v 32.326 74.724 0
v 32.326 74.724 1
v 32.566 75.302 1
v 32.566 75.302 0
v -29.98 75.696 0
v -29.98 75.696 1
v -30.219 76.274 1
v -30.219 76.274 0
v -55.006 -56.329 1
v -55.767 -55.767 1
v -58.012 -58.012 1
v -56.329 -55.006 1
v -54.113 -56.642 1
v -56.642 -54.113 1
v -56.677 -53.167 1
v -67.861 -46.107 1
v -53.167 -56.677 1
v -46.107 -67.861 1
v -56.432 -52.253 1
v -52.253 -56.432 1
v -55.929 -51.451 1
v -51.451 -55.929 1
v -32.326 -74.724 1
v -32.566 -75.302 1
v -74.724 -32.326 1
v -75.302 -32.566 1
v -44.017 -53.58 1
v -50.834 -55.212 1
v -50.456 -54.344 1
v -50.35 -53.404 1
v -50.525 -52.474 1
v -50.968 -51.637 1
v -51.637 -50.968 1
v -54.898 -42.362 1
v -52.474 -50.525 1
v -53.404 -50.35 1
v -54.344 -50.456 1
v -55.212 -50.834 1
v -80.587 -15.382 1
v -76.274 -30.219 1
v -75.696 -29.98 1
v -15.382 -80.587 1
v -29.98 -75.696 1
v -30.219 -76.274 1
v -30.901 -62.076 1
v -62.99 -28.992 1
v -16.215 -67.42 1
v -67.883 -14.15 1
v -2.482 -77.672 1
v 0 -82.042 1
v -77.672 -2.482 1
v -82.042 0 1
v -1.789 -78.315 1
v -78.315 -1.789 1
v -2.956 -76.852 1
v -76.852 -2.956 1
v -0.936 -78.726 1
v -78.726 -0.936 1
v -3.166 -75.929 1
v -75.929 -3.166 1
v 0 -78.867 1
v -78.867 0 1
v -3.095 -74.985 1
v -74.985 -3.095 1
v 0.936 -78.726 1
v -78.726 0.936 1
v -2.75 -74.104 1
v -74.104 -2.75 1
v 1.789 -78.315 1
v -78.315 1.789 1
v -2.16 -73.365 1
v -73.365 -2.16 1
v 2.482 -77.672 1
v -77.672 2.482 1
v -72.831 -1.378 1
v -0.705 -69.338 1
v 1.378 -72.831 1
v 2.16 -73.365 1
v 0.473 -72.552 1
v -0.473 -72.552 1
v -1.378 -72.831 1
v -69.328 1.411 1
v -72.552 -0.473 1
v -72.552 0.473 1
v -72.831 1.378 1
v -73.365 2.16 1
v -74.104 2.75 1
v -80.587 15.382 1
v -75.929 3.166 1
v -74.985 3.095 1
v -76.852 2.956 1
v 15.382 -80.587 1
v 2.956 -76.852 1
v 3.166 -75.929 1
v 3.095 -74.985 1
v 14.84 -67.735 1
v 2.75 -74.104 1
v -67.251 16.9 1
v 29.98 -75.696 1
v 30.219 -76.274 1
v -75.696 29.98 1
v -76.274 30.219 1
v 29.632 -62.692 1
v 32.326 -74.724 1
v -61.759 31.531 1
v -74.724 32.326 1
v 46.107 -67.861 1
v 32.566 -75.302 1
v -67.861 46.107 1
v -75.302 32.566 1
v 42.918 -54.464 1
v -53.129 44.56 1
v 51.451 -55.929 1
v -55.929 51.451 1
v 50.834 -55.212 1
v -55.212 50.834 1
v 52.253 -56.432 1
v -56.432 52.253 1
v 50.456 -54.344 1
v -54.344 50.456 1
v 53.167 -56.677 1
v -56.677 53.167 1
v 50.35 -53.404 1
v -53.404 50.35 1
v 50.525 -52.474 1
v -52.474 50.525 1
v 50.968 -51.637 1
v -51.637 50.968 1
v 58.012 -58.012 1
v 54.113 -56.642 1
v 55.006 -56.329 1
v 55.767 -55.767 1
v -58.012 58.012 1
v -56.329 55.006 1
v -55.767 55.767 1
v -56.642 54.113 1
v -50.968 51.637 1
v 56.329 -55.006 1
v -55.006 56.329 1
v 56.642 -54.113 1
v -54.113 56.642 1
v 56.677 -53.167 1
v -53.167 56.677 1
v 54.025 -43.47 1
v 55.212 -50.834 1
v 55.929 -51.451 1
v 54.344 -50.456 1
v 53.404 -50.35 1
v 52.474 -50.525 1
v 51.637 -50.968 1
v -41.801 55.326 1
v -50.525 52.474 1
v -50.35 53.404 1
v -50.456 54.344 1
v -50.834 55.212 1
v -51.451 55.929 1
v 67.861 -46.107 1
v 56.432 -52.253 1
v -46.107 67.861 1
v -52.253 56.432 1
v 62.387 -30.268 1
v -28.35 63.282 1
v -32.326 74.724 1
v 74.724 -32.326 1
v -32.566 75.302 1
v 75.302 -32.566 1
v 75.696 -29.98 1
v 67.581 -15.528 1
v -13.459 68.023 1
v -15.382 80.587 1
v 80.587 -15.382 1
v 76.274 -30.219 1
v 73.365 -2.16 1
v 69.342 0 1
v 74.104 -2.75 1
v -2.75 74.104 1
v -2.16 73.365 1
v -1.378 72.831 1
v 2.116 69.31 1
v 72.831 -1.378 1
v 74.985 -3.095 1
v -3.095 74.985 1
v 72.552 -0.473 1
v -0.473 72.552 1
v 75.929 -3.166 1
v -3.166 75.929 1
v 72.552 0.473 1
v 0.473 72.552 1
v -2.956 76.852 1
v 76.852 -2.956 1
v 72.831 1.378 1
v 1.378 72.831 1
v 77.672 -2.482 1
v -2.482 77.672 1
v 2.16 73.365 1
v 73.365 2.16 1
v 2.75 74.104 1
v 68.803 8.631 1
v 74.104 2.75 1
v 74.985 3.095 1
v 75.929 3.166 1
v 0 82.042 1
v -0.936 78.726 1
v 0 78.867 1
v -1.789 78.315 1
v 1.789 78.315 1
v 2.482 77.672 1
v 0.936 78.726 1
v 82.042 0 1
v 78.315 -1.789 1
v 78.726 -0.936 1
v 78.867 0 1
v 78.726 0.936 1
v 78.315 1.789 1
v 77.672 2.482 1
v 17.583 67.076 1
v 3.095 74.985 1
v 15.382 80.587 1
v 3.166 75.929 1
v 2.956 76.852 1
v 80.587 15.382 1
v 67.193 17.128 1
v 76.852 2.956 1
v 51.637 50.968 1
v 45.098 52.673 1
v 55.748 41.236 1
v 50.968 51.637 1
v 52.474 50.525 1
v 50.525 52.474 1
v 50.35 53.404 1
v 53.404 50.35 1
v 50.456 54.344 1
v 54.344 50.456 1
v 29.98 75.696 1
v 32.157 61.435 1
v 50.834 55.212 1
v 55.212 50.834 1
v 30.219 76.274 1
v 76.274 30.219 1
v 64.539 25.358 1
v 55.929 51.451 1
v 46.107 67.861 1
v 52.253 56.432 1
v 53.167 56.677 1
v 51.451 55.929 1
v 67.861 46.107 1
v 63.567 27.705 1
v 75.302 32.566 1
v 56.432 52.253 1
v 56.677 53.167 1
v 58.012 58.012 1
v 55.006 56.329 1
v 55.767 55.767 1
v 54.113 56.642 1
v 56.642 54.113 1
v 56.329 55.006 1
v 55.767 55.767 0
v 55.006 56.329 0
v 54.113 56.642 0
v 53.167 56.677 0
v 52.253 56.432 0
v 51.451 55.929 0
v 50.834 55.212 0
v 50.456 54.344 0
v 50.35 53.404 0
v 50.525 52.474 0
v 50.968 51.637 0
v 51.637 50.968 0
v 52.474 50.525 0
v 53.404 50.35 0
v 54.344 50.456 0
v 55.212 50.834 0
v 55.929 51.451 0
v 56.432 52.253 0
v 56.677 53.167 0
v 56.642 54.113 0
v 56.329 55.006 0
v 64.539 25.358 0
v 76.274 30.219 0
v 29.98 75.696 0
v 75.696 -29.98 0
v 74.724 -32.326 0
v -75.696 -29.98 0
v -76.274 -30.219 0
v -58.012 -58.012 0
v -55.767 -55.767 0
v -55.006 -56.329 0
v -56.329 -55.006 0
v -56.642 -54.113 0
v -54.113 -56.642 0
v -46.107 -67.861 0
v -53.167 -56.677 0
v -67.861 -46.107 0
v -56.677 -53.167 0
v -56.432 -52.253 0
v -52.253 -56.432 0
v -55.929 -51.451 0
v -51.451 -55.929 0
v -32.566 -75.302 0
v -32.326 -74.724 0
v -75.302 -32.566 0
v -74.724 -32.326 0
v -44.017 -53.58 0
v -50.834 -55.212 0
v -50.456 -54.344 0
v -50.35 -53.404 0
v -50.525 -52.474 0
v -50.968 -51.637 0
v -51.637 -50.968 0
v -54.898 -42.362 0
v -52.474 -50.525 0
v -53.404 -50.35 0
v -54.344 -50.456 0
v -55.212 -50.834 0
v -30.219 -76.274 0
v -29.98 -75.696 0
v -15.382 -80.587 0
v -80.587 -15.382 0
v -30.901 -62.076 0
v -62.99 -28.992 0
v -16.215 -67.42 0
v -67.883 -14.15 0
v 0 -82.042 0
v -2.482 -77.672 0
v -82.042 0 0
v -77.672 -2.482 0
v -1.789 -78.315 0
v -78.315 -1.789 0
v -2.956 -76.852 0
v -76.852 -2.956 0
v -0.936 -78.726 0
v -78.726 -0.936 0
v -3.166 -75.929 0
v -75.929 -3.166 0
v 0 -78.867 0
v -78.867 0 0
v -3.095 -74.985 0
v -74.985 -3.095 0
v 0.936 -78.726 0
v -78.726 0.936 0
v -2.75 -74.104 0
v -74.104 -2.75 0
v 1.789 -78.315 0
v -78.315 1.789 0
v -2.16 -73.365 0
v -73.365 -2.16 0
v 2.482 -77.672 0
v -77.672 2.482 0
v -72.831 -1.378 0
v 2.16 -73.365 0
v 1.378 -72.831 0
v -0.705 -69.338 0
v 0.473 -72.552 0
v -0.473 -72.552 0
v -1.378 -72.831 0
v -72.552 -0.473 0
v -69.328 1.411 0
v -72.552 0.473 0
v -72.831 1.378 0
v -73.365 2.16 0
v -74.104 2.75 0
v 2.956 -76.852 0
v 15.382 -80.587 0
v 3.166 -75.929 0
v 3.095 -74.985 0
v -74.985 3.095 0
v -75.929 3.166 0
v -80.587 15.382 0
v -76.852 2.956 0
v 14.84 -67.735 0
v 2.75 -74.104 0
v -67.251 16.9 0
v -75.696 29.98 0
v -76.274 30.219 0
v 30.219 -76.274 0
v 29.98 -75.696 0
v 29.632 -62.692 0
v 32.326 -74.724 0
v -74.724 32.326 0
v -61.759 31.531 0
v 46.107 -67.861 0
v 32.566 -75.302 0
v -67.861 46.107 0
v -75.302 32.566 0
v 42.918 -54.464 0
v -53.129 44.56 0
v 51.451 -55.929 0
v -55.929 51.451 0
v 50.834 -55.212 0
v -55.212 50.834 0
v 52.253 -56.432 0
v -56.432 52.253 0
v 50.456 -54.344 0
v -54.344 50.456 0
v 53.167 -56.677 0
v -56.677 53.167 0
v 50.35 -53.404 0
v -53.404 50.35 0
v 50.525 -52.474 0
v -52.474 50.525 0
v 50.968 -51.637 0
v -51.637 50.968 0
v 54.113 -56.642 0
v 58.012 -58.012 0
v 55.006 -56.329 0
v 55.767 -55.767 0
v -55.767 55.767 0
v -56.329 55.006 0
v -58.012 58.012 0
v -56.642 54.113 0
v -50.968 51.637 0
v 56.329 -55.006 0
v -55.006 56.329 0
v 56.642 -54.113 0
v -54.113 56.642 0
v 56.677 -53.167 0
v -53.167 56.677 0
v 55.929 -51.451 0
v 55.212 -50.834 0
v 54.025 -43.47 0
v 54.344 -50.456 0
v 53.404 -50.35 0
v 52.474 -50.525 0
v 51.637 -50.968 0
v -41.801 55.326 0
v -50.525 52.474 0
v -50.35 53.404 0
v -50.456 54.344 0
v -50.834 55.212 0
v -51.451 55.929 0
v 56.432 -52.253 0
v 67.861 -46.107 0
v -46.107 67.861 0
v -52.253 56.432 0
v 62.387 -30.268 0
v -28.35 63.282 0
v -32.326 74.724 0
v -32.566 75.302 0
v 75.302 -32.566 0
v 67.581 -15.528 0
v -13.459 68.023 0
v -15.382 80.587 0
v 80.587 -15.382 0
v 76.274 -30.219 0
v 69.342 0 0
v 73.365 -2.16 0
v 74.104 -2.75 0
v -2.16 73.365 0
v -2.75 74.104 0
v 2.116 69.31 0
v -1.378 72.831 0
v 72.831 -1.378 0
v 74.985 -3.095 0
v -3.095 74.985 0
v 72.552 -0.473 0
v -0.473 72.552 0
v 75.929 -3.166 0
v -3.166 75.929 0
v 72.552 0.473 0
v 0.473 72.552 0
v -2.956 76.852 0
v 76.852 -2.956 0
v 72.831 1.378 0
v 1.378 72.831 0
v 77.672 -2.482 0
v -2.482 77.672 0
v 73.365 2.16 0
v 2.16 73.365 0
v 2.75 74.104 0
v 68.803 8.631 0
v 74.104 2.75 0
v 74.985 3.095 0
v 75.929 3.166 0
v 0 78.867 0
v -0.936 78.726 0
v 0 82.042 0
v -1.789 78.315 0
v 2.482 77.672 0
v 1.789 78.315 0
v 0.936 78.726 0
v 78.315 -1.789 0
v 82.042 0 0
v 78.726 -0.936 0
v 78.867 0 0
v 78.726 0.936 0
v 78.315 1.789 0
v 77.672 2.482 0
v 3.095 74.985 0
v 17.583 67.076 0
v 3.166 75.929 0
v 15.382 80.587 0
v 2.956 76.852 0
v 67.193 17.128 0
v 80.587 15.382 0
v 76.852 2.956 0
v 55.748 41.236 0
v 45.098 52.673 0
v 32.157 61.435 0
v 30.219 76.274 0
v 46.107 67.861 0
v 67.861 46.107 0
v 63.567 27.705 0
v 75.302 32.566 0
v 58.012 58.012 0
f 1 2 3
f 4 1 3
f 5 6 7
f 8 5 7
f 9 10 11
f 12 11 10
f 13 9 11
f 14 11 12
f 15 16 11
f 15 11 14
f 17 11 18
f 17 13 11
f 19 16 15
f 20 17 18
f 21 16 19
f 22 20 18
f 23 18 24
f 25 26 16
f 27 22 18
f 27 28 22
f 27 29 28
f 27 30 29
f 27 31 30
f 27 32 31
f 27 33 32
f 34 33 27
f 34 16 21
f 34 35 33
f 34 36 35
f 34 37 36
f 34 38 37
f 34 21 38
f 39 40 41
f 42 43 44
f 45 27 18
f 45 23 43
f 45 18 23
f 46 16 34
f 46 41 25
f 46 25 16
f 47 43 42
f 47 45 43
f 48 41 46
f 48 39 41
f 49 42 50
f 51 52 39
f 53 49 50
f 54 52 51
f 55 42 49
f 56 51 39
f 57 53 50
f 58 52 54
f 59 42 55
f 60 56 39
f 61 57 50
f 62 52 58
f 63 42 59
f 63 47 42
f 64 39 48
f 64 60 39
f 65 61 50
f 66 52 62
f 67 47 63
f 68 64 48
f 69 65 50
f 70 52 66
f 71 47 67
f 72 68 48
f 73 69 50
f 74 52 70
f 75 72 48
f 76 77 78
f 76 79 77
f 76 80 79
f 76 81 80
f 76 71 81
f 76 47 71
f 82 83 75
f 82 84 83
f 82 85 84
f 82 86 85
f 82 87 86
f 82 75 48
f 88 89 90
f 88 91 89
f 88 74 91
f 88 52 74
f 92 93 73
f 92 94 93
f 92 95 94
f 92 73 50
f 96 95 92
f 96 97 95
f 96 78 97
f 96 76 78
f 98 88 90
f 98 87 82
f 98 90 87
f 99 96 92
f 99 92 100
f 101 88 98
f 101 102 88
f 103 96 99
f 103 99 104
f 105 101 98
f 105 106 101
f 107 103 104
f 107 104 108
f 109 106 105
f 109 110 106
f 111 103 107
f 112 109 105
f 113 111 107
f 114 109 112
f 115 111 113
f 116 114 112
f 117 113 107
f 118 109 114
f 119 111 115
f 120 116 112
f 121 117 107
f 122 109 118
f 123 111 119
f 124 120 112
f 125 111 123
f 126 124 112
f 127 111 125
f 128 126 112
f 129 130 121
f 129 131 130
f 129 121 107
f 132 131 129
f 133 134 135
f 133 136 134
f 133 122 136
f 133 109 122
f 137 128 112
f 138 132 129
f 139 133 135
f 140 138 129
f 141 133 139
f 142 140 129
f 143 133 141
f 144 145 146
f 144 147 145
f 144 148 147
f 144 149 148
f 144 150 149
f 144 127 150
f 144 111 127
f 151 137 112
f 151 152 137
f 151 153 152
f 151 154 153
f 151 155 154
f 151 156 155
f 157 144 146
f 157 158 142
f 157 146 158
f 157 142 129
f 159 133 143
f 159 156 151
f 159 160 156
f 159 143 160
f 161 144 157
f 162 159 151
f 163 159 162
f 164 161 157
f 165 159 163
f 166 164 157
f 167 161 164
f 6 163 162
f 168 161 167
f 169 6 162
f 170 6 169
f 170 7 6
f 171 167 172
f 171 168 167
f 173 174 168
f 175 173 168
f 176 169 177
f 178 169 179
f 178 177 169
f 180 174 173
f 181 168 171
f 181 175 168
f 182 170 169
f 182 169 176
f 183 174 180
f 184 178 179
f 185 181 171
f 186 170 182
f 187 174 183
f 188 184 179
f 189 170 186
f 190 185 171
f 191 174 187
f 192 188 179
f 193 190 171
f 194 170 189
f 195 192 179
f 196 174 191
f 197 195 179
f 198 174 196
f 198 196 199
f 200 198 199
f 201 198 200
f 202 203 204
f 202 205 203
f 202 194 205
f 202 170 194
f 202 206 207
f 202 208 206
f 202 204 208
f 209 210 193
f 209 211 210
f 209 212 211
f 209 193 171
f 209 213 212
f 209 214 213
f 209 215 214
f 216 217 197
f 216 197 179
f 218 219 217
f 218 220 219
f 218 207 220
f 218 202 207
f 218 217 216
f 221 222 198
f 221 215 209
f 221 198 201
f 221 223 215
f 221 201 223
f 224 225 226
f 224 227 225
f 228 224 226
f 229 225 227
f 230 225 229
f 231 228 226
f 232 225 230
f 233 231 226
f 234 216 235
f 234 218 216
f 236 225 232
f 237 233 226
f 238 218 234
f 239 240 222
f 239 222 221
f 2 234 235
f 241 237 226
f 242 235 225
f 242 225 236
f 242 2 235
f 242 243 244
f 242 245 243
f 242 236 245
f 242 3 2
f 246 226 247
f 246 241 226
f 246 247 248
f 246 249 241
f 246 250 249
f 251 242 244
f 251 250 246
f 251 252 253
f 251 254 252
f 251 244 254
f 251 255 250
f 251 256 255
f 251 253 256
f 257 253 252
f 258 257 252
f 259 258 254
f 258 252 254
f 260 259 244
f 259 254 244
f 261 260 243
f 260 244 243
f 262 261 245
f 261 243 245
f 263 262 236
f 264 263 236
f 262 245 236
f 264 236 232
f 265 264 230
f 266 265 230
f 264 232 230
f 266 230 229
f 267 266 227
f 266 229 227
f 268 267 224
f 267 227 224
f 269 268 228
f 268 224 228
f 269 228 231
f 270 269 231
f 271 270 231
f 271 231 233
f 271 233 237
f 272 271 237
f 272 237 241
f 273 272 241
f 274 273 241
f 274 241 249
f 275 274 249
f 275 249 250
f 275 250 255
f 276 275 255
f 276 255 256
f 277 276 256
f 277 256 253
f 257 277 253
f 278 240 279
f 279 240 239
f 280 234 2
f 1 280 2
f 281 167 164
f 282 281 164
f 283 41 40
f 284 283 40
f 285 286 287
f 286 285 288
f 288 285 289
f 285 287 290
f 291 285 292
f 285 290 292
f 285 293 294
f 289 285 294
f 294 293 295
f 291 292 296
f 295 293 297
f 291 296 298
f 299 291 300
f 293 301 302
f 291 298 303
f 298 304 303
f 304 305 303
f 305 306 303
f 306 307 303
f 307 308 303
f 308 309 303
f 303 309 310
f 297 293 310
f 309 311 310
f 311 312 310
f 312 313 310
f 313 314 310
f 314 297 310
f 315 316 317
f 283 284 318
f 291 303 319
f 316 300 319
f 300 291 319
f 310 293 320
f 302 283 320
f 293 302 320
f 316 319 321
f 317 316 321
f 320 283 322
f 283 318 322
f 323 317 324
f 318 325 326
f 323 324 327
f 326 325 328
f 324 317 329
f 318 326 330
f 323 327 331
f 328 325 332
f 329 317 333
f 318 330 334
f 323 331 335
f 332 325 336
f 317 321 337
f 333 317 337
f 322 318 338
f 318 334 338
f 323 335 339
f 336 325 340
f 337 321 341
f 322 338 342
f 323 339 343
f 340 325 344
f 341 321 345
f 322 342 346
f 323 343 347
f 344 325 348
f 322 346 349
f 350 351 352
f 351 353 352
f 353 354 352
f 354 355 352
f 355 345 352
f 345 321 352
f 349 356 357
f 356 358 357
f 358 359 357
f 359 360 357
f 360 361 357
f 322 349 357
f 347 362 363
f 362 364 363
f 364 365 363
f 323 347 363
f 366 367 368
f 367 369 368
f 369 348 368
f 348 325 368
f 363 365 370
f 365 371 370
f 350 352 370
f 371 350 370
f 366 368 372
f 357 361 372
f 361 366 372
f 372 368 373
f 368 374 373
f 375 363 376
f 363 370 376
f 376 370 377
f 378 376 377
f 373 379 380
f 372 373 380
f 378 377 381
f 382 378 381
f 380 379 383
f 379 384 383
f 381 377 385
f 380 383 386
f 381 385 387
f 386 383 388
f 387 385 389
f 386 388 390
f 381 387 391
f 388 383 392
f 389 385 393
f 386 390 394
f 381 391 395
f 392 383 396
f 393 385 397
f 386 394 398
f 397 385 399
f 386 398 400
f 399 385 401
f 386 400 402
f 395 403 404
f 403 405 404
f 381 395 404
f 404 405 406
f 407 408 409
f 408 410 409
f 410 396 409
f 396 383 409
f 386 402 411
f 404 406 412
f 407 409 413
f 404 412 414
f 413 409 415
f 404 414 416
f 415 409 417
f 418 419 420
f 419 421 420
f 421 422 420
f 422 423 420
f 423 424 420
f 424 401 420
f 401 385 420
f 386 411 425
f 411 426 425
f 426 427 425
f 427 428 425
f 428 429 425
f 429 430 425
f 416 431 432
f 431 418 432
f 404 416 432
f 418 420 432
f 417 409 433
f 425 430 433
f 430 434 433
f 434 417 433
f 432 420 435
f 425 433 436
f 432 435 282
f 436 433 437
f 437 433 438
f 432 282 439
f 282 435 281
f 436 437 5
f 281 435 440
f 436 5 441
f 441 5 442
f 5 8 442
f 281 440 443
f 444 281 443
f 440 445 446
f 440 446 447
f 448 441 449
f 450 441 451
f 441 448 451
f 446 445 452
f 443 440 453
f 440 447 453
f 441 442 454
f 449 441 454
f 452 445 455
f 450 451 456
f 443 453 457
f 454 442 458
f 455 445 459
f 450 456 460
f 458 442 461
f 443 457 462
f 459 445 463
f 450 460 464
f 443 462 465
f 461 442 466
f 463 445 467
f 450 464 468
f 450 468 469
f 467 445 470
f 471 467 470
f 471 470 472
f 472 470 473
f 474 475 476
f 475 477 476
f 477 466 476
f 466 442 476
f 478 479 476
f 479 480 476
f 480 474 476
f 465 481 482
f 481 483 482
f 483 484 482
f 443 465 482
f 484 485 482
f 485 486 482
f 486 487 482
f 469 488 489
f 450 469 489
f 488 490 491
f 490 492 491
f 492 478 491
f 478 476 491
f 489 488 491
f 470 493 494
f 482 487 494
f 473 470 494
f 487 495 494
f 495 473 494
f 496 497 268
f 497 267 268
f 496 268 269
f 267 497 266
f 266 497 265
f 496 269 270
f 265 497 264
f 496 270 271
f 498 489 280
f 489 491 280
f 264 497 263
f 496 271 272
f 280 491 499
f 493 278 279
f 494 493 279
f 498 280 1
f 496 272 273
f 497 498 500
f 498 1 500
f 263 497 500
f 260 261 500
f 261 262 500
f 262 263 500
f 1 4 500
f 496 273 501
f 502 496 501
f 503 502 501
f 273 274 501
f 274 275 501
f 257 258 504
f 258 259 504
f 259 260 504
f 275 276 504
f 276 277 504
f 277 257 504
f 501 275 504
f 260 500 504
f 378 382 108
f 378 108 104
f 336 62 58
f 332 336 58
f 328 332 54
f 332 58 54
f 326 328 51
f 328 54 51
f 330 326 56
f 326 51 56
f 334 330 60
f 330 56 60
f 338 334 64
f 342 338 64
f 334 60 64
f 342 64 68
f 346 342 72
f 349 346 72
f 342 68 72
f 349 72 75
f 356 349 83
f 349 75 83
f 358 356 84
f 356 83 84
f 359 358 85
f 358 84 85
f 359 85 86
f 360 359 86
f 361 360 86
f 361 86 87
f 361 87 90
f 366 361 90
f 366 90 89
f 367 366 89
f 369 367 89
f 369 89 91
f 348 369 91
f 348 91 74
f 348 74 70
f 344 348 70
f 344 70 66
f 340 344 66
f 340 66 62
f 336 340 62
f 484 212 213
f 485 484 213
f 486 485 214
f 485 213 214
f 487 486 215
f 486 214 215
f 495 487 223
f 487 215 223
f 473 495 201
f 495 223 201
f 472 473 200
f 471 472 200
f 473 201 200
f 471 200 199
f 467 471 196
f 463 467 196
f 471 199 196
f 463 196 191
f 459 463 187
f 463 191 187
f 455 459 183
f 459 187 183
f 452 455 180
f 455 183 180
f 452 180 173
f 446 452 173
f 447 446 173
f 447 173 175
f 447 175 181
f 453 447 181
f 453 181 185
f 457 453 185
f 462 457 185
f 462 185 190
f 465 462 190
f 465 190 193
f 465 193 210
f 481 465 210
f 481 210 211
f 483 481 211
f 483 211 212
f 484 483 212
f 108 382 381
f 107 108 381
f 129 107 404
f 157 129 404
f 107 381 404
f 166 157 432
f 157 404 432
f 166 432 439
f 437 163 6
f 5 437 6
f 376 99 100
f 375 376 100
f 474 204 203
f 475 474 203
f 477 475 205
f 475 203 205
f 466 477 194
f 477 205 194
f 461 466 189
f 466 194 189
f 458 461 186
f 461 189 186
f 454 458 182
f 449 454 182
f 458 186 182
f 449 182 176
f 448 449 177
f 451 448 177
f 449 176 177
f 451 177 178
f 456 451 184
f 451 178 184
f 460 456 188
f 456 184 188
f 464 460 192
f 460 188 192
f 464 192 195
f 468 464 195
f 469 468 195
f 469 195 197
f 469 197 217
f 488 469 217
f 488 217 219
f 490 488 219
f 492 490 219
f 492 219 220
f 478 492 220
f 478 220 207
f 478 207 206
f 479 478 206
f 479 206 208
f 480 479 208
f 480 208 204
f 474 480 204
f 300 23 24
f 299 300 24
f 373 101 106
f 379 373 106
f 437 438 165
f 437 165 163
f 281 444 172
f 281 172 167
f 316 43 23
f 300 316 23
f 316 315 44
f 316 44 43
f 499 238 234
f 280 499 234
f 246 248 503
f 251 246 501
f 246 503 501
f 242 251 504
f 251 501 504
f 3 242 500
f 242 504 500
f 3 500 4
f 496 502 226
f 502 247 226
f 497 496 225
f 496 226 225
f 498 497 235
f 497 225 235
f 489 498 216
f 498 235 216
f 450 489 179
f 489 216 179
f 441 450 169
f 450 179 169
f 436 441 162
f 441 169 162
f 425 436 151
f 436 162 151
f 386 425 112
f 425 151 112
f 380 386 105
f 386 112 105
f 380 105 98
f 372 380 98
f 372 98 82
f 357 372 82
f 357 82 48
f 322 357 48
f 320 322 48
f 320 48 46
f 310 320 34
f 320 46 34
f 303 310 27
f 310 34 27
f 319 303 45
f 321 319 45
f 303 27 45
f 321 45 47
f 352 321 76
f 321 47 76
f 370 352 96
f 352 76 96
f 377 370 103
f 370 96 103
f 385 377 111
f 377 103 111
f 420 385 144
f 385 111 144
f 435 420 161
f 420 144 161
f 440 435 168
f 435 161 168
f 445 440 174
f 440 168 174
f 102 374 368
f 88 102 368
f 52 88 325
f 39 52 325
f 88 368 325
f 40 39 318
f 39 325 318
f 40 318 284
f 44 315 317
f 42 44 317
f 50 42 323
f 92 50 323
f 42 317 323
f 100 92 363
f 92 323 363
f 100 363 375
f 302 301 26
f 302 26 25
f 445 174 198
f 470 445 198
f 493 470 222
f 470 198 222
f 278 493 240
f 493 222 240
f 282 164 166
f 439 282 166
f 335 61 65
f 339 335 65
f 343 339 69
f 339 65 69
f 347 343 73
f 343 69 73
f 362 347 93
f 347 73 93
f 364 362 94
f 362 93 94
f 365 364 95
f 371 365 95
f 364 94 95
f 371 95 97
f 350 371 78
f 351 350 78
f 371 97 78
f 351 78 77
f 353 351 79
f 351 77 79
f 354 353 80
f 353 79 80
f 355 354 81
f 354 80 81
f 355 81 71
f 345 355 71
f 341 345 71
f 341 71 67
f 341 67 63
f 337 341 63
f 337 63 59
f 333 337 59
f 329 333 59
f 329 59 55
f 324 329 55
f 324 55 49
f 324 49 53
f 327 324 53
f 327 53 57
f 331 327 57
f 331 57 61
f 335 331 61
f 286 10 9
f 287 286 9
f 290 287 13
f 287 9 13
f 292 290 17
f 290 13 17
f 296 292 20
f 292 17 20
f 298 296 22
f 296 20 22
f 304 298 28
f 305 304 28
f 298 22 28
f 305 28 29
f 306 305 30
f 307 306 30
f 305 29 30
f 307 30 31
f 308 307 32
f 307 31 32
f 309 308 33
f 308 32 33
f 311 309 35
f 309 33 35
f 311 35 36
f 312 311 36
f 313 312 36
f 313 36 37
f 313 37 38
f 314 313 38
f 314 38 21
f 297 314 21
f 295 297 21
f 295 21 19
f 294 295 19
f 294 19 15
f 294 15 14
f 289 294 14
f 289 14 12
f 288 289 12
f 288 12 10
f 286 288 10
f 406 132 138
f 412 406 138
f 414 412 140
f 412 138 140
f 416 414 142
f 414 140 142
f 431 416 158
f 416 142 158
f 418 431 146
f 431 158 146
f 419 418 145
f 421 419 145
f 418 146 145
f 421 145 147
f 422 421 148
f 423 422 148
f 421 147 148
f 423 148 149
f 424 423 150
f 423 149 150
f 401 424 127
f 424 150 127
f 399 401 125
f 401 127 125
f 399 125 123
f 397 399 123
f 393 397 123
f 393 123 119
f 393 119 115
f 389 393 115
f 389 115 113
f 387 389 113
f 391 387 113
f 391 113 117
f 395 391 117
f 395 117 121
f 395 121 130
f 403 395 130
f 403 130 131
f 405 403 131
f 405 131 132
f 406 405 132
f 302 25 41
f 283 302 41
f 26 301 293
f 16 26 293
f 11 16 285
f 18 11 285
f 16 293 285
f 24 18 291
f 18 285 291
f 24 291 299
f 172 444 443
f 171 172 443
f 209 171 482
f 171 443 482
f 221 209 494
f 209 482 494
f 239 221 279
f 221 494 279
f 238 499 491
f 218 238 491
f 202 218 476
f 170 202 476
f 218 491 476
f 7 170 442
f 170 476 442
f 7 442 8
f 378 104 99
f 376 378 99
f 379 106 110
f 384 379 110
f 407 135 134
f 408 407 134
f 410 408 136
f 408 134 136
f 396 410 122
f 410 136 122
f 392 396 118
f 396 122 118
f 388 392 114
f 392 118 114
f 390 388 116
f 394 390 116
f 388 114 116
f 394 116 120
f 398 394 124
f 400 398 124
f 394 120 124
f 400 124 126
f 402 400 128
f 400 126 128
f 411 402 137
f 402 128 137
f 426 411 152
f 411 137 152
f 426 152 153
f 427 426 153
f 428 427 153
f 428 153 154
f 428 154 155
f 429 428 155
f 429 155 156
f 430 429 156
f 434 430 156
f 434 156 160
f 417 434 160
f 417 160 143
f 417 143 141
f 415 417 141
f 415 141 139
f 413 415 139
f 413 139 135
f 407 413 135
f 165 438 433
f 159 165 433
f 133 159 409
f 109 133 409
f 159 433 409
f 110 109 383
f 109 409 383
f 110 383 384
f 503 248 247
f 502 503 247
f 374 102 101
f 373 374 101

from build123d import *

# Parameters (mm, degrees)
SKETCH4_R           = 82.042
BOSS_EXTRUDE2_DEPTH = 1
SKETCH5_R           = 69.342
CUT_EXTRUDE5_DEPTH  = 2
SKETCH6_R           = 3.175
CUT_EXTRUDE6_DEPTH  = 2
CIRPATTERN1_COUNT   = 8
CUT_EXTRUDE11_DEPTH = 2


with BuildPart() as part:
    # Sketch4 → Boss-Extrude2 (new body)
    with BuildSketch(Plane.XY):
        Circle(SKETCH4_R)
    extrude(amount=BOSS_EXTRUDE2_DEPTH)

    # Sketch5 → Cut-Extrude5 (cut, through all)
    with BuildSketch(Plane.XY.offset(1)):
        Circle(SKETCH5_R)
    extrude(amount=-CUT_EXTRUDE5_DEPTH, mode=Mode.SUBTRACT)

    # Sketch6 → Cut-Extrude6 (cut, through all)
    with BuildSketch(Plane.XY.offset(1)):
        with Locations((75.692, 0)):
            Circle(SKETCH6_R)
    cut_extrude6 = extrude(amount=-CUT_EXTRUDE6_DEPTH, mode=Mode.SUBTRACT)

    # CirPattern1: Cut-Extrude6 ×8 about axis
    cirpattern1_axis = Axis((0, 0, 0), (0, 0, 1))
    for i in range(1, CIRPATTERN1_COUNT):
        add(cut_extrude6.rotate(cirpattern1_axis, i * 360 / CIRPATTERN1_COUNT), mode=Mode.SUBTRACT)

    # Sketch8 → Cut-Extrude11 (cut, through all)
    with BuildSketch(Plane.XY.offset(1)):
        Polygon((78.830897666, 34.027465042), (60.057665565, 26.251337696), (61.029681484, 23.904683683), (79.802913584, 31.680811029), align=None)
        Polygon((32.812445144, 75.89758015), (30.465791131, 76.869596069), (29.979783172, 75.696269062), (32.326437185, 74.724253144), align=None)
        Polygon((-30.465791131, 76.869596069), (-32.812445144, 75.89758015), (-32.326437185, 74.724253144), (-29.979783172, 75.696269062), align=None)
        Polygon((-75.89758015, 32.812445144), (-76.869596069, 30.465791131), (-75.696269062, 29.979783172), (-74.724253144, 32.326437185), align=None)
        Polygon((-76.869596069, -30.465791131), (-75.89758015, -32.812445144), (-74.724253144, -32.326437185), (-75.696269062, -29.979783172), align=None)
        Polygon((-32.812445144, -75.89758015), (-30.465791131, -76.869596069), (-29.979783172, -75.696269062), (-32.326437185, -74.724253144), align=None)
        Polygon((30.465791131, -76.869596069), (32.812445144, -75.89758015), (32.326437185, -74.724253144), (29.979783172, -75.696269062), align=None)
        Polygon((75.89758015, -32.812445144), (76.869596069, -30.465791131), (75.696269062, -29.979783172), (74.724253144, -32.326437185), align=None)
    extrude(amount=-CUT_EXTRUDE11_DEPTH, mode=Mode.SUBTRACT)


solid = part.part
